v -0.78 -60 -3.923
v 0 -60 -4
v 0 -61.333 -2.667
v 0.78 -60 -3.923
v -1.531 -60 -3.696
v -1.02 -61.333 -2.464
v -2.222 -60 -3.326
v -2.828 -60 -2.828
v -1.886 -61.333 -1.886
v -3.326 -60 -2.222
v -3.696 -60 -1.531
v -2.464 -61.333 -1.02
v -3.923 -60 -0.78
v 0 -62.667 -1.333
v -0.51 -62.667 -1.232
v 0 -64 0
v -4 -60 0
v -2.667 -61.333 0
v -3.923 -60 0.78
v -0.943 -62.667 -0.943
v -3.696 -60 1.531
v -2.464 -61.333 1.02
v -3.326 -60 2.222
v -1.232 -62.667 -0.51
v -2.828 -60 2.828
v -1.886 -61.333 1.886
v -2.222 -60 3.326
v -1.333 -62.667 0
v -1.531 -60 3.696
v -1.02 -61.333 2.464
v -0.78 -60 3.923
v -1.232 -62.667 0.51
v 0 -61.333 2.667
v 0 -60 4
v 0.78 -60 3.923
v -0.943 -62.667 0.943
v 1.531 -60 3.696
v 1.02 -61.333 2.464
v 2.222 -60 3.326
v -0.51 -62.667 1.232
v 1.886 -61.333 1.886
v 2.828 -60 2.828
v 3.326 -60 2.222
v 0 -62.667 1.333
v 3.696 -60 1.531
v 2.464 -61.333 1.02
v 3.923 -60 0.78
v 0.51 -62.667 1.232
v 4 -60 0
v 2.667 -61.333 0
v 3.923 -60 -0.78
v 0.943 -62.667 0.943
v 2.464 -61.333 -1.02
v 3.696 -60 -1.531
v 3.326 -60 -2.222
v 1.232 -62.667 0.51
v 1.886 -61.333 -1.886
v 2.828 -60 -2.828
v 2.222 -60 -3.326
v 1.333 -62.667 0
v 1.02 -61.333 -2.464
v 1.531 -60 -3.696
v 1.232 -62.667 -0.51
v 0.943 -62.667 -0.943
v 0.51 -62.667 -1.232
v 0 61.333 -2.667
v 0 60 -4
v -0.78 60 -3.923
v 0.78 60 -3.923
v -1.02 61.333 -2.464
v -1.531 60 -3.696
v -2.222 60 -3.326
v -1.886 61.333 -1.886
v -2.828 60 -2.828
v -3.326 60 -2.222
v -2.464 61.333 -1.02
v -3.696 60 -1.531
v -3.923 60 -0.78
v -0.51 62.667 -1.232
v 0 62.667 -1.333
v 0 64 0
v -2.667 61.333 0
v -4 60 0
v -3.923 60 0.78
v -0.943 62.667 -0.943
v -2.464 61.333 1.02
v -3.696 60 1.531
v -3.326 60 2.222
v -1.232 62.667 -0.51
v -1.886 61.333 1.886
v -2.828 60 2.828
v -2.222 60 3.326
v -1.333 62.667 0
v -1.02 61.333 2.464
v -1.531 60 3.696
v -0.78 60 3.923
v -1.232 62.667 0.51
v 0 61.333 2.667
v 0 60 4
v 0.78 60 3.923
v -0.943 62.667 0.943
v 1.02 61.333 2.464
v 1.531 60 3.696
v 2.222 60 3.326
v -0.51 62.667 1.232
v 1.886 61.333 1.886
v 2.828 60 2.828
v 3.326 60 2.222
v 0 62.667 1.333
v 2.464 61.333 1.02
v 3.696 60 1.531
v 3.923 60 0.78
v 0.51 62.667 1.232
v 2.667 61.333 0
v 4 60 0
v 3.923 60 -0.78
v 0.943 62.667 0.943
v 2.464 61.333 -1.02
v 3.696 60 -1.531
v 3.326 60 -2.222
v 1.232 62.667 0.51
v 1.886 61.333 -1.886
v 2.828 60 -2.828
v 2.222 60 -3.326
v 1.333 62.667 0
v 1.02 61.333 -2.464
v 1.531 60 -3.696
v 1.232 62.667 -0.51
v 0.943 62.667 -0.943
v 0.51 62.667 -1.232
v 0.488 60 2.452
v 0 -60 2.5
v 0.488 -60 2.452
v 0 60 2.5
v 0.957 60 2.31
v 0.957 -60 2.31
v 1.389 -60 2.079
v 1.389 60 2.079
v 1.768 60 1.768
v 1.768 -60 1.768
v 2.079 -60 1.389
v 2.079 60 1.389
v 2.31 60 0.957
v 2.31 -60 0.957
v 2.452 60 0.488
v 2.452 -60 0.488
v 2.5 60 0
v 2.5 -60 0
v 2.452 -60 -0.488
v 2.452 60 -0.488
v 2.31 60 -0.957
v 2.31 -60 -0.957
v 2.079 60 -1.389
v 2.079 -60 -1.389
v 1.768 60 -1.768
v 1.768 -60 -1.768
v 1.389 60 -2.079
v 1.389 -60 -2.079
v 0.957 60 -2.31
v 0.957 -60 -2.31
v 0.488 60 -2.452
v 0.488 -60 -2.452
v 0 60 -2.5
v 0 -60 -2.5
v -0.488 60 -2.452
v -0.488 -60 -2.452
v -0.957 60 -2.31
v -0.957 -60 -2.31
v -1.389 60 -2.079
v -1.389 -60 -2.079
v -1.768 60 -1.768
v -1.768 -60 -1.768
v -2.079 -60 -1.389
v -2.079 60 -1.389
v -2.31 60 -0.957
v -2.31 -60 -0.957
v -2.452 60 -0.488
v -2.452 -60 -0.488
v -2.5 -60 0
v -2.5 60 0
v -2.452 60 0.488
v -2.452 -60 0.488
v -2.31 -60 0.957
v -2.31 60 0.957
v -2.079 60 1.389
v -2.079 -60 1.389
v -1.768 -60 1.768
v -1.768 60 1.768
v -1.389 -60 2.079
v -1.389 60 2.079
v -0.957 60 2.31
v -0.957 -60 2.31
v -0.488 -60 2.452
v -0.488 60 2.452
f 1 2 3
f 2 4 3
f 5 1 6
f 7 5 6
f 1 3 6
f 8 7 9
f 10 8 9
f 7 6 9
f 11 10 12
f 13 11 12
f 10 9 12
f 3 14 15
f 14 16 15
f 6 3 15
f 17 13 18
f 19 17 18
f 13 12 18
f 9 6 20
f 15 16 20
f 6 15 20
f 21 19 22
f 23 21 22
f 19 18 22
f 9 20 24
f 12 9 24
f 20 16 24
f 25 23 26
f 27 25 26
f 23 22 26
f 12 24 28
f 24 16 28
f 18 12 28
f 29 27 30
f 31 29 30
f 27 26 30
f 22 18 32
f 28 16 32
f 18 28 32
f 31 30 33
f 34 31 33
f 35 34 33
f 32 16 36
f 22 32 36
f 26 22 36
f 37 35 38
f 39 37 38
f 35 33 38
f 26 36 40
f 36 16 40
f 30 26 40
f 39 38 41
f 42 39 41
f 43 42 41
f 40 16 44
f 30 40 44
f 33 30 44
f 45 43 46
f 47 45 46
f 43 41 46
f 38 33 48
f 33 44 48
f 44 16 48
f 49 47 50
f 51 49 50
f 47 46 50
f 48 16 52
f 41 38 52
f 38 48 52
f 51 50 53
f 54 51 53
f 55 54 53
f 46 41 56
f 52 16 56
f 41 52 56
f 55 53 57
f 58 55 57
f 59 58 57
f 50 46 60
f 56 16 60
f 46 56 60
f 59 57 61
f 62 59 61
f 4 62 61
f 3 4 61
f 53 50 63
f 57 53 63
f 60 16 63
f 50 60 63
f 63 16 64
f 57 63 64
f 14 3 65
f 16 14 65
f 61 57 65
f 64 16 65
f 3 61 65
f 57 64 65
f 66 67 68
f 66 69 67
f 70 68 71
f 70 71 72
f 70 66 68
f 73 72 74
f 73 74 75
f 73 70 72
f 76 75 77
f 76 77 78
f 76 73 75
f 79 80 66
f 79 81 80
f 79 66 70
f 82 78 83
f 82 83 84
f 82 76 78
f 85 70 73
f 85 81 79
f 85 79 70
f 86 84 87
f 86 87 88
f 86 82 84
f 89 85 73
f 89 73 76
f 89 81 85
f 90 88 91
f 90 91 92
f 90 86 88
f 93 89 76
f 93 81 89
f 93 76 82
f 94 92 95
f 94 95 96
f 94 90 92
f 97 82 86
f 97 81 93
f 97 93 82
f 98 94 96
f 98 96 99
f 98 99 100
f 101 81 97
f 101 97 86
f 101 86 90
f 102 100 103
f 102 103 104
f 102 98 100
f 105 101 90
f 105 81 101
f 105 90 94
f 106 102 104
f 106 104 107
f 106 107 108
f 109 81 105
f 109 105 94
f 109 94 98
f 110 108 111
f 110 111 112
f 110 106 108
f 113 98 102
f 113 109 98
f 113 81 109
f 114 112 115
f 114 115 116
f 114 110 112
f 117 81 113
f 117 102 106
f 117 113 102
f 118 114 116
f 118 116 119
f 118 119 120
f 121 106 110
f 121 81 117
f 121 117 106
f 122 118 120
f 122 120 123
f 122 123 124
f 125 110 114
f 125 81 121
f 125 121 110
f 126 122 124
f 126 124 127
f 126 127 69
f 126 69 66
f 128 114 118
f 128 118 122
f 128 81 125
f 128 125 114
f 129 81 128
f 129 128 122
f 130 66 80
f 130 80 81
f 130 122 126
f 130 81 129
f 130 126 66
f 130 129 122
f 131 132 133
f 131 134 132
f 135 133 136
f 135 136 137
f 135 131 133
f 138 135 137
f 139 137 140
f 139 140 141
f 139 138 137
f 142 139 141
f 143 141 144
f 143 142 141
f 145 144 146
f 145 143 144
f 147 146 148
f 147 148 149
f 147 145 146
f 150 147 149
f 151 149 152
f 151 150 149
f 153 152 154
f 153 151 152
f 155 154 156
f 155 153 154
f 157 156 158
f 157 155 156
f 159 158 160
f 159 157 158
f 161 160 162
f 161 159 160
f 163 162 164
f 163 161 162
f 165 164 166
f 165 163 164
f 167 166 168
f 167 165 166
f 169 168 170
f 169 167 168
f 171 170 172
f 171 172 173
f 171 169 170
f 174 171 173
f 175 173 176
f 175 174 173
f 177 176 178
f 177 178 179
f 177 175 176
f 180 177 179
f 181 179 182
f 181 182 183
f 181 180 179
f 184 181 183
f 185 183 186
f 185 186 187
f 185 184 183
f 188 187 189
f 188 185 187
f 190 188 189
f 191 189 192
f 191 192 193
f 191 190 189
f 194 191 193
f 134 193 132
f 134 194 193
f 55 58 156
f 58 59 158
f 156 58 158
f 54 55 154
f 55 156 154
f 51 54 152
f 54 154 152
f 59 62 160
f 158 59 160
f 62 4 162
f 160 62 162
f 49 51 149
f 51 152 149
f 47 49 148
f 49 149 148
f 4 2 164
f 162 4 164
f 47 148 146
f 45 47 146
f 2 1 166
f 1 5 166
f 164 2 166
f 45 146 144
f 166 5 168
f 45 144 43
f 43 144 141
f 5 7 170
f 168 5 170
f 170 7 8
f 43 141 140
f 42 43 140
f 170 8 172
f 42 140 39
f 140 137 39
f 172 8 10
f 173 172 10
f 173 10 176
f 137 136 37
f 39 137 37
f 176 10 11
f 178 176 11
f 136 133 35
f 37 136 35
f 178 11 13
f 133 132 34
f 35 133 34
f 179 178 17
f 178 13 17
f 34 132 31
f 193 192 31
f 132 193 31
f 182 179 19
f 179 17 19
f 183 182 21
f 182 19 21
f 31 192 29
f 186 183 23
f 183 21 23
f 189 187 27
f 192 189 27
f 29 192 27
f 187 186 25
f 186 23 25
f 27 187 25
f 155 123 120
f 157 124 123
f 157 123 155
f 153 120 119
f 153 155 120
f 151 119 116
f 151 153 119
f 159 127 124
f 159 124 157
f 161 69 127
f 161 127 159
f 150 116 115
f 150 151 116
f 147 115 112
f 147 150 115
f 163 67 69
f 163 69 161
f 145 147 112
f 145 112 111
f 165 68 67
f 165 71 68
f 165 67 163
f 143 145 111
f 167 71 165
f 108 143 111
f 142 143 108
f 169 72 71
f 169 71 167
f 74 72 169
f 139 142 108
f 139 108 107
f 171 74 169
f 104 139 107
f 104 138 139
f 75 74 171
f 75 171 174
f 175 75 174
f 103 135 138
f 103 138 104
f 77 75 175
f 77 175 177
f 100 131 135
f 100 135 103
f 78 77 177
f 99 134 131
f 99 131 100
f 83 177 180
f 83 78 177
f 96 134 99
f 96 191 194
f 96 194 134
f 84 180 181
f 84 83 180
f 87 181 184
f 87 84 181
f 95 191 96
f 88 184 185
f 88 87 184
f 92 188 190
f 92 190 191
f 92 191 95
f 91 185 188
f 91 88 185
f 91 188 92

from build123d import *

# Parameters (mm, degrees)
SKETCH1_R           = 2.5
BOSS_EXTRUDE1_DEPTH = 60


with BuildPart() as part:
    # Sketch1 → Boss-Extrude1 (new, symmetric)
    with BuildSketch(Plane(origin=(0, 0, 0), x_dir=(1, 0, 0), z_dir=(0, 1, 0))):
        with Locations(Location((0, 0, 0), (0, 0, 270))):
            Circle(SKETCH1_R)
    extrude(amount=BOSS_EXTRUDE1_DEPTH, both=True)


with BuildPart() as body_2:
    # Boss-Extrude2 cone 1 section (through the dimple's axis) → Boss-Extrude2 (revolve)
    with BuildSketch(Plane(origin=(0, 60, 0), x_dir=(0, 0, -1), z_dir=(1, 0, 0))):
        Polygon((0, 0), (4, 0), (0, 4), align=None)
    revolve(axis=Axis((0, 60, 0), (0, 1, 0)))


with BuildPart() as body_3:
    # Mirror1: mirrored copy
    add(body_2.part.mirror(Plane.ZX))


with BuildPart() as part_1:
    add(part.part)

    # Combine1: union body 2, body 3
    add(body_2.part)
    add(body_3.part)


solid = part_1.part
